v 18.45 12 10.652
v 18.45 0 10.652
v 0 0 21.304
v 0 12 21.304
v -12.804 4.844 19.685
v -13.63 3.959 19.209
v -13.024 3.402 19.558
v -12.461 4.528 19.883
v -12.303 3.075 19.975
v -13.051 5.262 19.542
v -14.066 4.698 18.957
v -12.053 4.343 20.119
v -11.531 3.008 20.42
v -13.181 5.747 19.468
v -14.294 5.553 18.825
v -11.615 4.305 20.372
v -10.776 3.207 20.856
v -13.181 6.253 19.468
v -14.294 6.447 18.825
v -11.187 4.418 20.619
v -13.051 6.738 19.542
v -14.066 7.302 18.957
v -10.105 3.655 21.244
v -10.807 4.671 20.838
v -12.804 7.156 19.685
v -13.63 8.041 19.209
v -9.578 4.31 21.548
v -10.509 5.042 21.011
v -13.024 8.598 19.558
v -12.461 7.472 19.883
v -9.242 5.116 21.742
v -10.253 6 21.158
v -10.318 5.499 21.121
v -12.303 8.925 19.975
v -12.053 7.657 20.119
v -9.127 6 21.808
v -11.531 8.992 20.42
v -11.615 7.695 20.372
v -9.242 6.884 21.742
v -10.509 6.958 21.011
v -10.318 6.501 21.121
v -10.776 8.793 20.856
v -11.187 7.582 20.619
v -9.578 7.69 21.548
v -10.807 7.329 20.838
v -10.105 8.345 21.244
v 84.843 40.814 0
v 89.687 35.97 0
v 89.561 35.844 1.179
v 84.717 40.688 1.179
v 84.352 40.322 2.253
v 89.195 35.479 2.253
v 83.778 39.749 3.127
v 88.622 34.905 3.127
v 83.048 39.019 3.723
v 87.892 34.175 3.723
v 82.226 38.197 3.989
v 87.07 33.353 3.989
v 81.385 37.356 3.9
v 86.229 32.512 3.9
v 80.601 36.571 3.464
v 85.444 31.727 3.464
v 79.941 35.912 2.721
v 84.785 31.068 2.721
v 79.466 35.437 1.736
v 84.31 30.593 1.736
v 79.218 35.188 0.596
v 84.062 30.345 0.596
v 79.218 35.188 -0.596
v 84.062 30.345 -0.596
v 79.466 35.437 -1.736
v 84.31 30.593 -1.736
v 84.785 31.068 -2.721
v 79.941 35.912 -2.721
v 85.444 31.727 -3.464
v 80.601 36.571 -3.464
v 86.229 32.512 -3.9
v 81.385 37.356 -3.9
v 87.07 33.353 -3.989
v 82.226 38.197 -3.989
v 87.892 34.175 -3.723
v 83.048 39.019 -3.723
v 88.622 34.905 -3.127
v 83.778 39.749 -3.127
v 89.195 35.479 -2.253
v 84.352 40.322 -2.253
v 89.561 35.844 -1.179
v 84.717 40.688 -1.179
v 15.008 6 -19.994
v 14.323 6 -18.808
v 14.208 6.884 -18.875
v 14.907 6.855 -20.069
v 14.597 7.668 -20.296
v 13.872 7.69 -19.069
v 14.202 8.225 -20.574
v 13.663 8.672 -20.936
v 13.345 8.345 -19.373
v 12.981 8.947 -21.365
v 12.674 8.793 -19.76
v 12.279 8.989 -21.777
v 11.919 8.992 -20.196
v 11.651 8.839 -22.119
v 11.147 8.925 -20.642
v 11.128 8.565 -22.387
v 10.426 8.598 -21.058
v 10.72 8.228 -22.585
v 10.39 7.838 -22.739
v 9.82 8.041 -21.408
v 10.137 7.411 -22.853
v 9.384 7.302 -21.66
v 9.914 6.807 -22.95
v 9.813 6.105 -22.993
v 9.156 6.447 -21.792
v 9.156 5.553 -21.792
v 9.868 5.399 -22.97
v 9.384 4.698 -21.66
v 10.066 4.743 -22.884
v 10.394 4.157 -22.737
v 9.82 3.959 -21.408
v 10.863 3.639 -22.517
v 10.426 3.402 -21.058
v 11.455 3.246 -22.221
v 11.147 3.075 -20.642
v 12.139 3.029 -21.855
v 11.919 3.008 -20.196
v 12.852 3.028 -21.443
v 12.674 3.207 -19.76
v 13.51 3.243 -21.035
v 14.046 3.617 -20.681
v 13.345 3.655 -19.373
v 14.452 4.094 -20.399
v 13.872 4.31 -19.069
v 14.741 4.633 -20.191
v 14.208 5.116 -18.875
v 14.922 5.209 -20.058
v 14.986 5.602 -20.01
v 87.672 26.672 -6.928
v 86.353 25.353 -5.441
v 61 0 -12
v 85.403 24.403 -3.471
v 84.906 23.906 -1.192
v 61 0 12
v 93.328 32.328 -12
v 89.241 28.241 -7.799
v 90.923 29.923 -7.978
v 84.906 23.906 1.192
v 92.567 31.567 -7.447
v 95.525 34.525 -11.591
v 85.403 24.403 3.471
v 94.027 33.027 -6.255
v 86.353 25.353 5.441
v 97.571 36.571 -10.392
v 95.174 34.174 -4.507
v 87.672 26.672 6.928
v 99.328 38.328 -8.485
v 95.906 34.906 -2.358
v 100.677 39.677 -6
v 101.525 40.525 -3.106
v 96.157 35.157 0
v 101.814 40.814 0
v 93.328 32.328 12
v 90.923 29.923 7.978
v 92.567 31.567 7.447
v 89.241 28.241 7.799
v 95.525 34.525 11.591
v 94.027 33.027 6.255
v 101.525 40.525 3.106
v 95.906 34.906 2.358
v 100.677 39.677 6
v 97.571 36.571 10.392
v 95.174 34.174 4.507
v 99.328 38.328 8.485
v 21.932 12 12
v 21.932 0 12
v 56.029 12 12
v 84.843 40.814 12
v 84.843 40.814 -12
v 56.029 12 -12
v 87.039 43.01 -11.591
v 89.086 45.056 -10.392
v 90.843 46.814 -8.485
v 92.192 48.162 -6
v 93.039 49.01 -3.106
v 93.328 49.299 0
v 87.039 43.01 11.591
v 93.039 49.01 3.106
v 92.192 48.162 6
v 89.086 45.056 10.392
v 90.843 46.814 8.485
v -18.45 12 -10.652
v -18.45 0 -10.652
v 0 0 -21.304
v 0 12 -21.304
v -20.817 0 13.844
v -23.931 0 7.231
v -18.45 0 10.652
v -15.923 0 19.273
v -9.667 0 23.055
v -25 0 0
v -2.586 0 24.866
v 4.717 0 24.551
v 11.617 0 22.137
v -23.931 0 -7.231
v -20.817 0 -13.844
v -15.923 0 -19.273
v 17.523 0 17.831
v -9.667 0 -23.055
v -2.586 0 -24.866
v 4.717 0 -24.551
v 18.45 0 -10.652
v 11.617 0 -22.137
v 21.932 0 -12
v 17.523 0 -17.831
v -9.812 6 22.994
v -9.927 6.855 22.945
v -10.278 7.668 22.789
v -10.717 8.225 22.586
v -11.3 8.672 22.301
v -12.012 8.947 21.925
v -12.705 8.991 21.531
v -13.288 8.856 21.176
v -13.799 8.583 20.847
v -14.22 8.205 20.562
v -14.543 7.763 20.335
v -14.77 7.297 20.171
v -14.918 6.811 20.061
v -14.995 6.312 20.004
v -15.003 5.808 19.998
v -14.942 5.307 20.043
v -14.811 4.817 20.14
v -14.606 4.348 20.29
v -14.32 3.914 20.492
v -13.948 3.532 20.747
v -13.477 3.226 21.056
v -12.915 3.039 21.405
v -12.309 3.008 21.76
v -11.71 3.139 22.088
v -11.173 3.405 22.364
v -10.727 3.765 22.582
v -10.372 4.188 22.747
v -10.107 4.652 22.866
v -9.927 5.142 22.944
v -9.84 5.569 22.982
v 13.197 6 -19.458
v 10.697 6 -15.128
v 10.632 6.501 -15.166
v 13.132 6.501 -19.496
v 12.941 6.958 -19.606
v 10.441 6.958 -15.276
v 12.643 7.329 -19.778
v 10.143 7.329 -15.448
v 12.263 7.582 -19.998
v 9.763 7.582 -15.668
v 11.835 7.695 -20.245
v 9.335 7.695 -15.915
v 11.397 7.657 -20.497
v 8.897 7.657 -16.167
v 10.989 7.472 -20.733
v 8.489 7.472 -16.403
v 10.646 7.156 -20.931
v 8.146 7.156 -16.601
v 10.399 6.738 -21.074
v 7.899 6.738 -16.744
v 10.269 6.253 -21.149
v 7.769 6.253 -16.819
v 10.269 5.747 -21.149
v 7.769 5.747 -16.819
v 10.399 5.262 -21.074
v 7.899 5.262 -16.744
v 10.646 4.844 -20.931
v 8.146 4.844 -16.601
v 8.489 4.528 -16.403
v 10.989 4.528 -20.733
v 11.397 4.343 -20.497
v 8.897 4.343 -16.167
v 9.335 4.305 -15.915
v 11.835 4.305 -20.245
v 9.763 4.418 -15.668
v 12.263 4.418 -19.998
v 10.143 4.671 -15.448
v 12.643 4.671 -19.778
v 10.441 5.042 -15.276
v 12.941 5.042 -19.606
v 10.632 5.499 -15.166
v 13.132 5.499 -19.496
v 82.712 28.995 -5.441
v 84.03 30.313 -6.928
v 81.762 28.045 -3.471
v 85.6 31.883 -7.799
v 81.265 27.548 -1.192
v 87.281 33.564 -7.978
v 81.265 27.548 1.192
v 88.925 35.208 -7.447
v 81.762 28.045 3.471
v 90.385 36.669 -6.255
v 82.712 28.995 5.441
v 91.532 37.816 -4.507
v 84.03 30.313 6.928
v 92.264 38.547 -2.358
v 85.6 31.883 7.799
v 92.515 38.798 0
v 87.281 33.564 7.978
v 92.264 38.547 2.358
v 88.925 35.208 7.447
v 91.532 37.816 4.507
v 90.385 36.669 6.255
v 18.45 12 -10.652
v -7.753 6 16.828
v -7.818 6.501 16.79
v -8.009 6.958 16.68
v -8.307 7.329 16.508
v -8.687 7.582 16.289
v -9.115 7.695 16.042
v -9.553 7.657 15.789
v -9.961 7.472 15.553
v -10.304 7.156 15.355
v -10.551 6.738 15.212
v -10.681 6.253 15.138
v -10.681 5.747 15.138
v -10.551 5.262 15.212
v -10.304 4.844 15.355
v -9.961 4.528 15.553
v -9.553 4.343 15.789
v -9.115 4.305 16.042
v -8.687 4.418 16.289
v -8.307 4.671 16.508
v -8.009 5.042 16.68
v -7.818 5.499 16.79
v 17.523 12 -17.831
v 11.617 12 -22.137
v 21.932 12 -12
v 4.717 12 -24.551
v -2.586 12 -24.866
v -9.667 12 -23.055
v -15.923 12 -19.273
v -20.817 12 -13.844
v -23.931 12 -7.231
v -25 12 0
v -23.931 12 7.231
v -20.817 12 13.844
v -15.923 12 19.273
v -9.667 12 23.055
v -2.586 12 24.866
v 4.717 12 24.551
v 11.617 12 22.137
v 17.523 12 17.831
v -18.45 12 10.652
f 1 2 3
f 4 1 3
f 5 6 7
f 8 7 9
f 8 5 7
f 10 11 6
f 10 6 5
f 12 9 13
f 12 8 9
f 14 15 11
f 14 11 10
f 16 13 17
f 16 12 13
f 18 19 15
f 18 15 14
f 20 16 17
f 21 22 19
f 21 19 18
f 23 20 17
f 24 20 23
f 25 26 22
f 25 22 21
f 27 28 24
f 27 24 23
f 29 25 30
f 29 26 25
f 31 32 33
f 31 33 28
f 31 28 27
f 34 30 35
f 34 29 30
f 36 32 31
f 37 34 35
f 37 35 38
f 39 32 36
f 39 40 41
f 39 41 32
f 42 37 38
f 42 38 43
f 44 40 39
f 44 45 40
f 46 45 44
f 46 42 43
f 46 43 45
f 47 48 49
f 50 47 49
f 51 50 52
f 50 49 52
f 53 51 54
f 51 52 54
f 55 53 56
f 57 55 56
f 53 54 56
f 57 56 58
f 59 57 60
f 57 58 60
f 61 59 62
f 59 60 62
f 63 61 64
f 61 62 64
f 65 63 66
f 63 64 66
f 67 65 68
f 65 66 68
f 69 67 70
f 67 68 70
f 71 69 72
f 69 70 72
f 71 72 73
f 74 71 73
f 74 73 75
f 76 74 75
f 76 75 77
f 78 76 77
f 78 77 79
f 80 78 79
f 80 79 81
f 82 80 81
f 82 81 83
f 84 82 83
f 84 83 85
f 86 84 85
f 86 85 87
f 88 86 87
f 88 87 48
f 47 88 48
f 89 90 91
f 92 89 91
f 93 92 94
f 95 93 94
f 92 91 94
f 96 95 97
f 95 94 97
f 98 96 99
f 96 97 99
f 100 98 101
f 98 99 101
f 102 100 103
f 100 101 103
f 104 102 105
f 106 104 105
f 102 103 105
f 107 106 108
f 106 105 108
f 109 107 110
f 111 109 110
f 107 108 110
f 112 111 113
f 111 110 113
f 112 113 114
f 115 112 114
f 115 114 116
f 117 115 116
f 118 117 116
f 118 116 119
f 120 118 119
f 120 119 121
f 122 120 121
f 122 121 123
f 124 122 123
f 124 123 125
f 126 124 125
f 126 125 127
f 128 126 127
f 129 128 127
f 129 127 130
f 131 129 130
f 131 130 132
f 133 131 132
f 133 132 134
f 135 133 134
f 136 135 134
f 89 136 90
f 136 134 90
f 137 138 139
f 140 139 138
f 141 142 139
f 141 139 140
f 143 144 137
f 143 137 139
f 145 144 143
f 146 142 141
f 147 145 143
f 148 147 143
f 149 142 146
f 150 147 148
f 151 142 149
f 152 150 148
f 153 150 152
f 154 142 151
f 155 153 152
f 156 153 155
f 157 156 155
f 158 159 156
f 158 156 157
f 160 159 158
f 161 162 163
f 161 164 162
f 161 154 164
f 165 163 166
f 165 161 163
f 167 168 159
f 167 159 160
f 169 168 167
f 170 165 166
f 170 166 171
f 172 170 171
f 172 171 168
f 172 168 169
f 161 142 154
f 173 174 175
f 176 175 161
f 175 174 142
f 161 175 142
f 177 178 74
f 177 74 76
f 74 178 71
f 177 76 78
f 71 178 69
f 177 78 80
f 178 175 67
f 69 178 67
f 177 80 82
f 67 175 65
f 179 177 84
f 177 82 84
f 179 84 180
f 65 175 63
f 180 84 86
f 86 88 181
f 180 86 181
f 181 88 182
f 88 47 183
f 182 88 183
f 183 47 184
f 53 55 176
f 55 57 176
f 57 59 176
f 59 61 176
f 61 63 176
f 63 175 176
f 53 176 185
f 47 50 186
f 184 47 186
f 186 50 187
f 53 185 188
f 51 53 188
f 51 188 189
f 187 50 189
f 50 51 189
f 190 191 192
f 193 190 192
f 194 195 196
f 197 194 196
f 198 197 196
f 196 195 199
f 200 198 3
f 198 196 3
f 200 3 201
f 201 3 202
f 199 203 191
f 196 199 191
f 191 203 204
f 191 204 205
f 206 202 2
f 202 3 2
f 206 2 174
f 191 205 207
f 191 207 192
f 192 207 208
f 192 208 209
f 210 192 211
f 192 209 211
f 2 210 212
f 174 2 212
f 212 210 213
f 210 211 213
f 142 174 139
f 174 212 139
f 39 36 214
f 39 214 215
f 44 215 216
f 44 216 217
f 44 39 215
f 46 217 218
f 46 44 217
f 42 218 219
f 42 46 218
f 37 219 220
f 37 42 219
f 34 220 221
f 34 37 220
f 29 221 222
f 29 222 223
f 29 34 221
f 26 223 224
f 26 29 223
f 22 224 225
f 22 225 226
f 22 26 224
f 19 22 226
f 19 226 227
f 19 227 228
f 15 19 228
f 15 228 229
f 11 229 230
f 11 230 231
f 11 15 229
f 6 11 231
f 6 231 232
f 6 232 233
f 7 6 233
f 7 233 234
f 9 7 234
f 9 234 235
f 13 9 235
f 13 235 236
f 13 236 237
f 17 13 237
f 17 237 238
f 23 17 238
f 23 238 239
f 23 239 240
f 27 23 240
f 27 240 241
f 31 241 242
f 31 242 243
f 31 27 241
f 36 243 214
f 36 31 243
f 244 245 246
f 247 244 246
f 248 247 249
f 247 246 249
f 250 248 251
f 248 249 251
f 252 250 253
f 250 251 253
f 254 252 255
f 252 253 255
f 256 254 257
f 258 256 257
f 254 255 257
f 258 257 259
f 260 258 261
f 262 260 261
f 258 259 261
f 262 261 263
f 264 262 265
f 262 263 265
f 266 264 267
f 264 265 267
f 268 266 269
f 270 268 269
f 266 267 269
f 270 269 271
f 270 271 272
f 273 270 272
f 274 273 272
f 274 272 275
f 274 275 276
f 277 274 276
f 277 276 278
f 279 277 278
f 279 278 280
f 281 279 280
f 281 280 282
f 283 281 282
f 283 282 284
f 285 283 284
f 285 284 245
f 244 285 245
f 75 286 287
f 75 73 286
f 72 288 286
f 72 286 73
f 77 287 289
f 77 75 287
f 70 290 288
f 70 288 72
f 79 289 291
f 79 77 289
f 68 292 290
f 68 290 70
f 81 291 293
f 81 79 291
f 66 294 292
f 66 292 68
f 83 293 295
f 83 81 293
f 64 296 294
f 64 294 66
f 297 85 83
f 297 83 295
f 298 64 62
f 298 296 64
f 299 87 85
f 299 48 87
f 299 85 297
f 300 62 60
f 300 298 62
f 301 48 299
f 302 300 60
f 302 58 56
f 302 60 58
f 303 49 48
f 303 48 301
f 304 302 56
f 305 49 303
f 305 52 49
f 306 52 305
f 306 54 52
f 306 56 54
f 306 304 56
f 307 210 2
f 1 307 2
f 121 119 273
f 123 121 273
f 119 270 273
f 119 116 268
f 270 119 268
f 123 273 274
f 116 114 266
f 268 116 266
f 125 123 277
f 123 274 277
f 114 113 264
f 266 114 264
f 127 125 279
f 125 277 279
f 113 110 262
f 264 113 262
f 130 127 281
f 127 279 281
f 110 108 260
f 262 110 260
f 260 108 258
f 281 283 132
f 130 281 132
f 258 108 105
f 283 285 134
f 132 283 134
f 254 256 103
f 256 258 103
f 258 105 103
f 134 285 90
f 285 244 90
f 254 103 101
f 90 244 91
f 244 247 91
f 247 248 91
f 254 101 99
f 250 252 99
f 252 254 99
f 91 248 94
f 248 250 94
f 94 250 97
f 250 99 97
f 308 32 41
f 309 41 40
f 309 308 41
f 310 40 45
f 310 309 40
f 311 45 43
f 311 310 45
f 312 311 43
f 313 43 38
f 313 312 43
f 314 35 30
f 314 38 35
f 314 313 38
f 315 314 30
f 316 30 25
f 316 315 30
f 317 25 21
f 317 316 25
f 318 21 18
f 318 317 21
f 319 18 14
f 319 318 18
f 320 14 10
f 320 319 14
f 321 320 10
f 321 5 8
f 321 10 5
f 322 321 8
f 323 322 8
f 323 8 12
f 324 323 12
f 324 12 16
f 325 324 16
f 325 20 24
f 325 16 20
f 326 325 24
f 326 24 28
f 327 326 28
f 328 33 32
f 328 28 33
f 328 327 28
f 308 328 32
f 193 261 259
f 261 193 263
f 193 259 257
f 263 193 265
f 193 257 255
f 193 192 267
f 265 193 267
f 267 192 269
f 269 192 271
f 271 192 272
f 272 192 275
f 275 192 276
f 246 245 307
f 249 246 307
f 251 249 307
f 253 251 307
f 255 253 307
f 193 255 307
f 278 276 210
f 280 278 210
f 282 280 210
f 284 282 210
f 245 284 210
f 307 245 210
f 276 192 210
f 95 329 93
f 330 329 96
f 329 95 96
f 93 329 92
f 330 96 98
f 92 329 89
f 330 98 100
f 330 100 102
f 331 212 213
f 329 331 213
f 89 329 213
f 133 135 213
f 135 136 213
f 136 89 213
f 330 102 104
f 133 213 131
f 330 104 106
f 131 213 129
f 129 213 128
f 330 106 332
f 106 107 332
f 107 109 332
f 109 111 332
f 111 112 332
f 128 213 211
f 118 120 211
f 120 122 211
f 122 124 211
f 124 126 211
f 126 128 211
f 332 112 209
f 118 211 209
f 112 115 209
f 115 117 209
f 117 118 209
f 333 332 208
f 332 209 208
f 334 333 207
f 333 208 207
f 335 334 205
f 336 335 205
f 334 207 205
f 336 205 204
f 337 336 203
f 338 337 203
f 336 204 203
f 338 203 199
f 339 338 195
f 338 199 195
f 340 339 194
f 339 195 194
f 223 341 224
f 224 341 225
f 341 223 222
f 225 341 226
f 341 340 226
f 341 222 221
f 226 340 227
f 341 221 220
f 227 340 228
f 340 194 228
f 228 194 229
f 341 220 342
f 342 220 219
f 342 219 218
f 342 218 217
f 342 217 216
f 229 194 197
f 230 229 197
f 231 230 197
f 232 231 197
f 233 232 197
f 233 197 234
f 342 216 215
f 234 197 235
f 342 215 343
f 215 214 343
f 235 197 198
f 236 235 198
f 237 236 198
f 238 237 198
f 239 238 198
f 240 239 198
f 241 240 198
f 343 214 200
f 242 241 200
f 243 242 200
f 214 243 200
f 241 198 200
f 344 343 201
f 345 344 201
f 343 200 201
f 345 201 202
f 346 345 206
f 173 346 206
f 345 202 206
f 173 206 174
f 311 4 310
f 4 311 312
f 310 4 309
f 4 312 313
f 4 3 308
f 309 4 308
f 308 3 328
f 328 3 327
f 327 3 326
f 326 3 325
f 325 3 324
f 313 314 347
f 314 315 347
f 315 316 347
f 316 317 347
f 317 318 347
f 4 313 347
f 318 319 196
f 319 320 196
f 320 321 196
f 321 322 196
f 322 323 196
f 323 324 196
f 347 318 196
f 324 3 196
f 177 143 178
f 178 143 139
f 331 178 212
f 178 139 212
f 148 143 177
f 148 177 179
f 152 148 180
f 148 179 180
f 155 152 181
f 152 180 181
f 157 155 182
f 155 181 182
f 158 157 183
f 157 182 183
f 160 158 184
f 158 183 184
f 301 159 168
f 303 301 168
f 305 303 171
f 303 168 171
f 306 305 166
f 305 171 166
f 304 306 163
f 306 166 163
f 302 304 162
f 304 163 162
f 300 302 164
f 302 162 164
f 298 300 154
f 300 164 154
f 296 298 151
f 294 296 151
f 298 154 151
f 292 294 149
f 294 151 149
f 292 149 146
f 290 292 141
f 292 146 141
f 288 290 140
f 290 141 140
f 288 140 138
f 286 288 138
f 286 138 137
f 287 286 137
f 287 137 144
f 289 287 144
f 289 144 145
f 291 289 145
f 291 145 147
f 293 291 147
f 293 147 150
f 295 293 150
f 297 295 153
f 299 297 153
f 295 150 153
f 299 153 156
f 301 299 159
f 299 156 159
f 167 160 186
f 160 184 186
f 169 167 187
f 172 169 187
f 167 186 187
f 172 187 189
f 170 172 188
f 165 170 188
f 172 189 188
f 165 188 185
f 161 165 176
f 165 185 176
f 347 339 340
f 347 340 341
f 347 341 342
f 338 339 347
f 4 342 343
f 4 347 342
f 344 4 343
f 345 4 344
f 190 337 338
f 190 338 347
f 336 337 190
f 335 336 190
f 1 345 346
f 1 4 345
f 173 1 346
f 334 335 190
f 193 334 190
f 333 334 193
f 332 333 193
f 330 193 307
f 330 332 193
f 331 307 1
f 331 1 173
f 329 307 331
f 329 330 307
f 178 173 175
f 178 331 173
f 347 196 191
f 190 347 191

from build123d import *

# Parameters (mm, degrees)
BOSS_EXTRUDE1_DEPTH = 12
SKETCH4_W           = 57.71930009
SKETCH4_H           = 24
SKETCH4_R           = 4
BOSS_EXTRUDE2_DEPTH = 12
SKETCH4_3_R         = 8
SKETCH4_3_R_2       = 4
CUT_EXTRUDE1_DEPTH  = 5.15
FILLET1_R           = 12
SKETCH5_R           = 1.7
CUT_EXTRUDE2_DEPTH  = 113.615583531
CUT_EXTRUDE3_START  = -5
SKETCH5_3_R         = 3
CUT_EXTRUDE3_DEPTH  = 108.615583567


with BuildPart() as part:
    # Sketch3 → Boss-Extrude1 (new body)
    with BuildSketch(Plane(origin=(0, 0, 0), x_dir=(1, 0, 0), z_dir=(0, 1, 0))):
        with BuildLine():
            ThreePointArc((21.931712199, 12), (-25, 0), (21.931712199, -12))
            Line((21.931712199, -12), (61, -12))
            Line((61, -12), (61, 12))
            Line((61, 12), (21.931712199, 12))
        make_face()
        Polygon((-18.45, 10.652112467), (0, 21.304224933), (18.45, 10.652112467), (18.45, -10.652112467), (0, -21.304224933), (-18.45, -10.652112467), align=None, mode=Mode.SUBTRACT)
    extrude(amount=BOSS_EXTRUDE1_DEPTH)

    # Sketch4 → Boss-Extrude2 (add)
    with BuildSketch(Plane(origin=(30.5, -30.5, 0), x_dir=(0.7071067811865462, 0.7071067811865489, 0), z_dir=(0.7071067811865489, -0.7071067811865462, 0))):
        with Locations((71.993163697, 0)):
            Rectangle(SKETCH4_W, SKETCH4_H)
        with Locations((84.852813742, 0)):
            Circle(SKETCH4_R, mode=Mode.SUBTRACT)
    extrude(amount=-BOSS_EXTRUDE2_DEPTH)

    # Sketch4<3> → Cut-Extrude1 (cut)
    with BuildSketch(Plane(origin=(30.5, -30.5, 0), x_dir=(0.7071067811865462, 0.7071067811865489, 0), z_dir=(0.7071067811865489, -0.7071067811865462, 0))):
        with Locations((84.852813742, 0)):
            Circle(SKETCH4_3_R)
        with Locations((84.852813742, 0)):
            Circle(SKETCH4_3_R_2, mode=Mode.SUBTRACT)
    extrude(amount=-CUT_EXTRUDE1_DEPTH, mode=Mode.SUBTRACT)

    # Fillet1
    fillet1_edges = [part.edges().sort_by_distance(p)[0] for p in [
        (97.571067812, 45.056349186, -12),
        (97.571067812, 45.056349186, 12),
    ]]
    fillet(fillet1_edges, radius=FILLET1_R - 0.0001)  # a hair under: the kernel refuses the full size

    # Sketch5 → Cut-Extrude2 (cut, through all)
    with BuildSketch(Plane(origin=(9.225, 0, -15.9781687), x_dir=(0.8660254037844388, 0, 0.4999999999999997), z_dir=(-0.49999999999999983, 0, 0.8660254037844389))):
        with Locations((0, 6)):
            Circle(SKETCH5_R)
    cut_extrude2 = extrude(amount=-CUT_EXTRUDE2_DEPTH, mode=Mode.SUBTRACT)

    # Sketch5<3> → Cut-Extrude3 (cut, through all)
    with BuildSketch(Plane(origin=(9.225, 0, -15.9781687), x_dir=(0.8660254037844388, 0, 0.4999999999999997), z_dir=(-0.49999999999999983, 0, 0.8660254037844389)).offset(CUT_EXTRUDE3_START)):
        with Locations((0, 6)):
            Circle(SKETCH5_3_R)
    cut_extrude3 = extrude(amount=-CUT_EXTRUDE3_DEPTH, mode=Mode.SUBTRACT)

    # Mirror1: Cut-Extrude2, Cut-Extrude3 across plane
    add(cut_extrude2.mirror(Plane(origin=(0, 0, 0), x_dir=(0.866025403784439, 0, 0.4999999999999995), z_dir=(-0.49999999999999994, 0, 0.8660254037844388))), mode=Mode.SUBTRACT)
    add(cut_extrude3.mirror(Plane(origin=(0, 0, 0), x_dir=(0.866025403784439, 0, 0.4999999999999995), z_dir=(-0.49999999999999994, 0, 0.8660254037844388))), mode=Mode.SUBTRACT)


solid = part.part
